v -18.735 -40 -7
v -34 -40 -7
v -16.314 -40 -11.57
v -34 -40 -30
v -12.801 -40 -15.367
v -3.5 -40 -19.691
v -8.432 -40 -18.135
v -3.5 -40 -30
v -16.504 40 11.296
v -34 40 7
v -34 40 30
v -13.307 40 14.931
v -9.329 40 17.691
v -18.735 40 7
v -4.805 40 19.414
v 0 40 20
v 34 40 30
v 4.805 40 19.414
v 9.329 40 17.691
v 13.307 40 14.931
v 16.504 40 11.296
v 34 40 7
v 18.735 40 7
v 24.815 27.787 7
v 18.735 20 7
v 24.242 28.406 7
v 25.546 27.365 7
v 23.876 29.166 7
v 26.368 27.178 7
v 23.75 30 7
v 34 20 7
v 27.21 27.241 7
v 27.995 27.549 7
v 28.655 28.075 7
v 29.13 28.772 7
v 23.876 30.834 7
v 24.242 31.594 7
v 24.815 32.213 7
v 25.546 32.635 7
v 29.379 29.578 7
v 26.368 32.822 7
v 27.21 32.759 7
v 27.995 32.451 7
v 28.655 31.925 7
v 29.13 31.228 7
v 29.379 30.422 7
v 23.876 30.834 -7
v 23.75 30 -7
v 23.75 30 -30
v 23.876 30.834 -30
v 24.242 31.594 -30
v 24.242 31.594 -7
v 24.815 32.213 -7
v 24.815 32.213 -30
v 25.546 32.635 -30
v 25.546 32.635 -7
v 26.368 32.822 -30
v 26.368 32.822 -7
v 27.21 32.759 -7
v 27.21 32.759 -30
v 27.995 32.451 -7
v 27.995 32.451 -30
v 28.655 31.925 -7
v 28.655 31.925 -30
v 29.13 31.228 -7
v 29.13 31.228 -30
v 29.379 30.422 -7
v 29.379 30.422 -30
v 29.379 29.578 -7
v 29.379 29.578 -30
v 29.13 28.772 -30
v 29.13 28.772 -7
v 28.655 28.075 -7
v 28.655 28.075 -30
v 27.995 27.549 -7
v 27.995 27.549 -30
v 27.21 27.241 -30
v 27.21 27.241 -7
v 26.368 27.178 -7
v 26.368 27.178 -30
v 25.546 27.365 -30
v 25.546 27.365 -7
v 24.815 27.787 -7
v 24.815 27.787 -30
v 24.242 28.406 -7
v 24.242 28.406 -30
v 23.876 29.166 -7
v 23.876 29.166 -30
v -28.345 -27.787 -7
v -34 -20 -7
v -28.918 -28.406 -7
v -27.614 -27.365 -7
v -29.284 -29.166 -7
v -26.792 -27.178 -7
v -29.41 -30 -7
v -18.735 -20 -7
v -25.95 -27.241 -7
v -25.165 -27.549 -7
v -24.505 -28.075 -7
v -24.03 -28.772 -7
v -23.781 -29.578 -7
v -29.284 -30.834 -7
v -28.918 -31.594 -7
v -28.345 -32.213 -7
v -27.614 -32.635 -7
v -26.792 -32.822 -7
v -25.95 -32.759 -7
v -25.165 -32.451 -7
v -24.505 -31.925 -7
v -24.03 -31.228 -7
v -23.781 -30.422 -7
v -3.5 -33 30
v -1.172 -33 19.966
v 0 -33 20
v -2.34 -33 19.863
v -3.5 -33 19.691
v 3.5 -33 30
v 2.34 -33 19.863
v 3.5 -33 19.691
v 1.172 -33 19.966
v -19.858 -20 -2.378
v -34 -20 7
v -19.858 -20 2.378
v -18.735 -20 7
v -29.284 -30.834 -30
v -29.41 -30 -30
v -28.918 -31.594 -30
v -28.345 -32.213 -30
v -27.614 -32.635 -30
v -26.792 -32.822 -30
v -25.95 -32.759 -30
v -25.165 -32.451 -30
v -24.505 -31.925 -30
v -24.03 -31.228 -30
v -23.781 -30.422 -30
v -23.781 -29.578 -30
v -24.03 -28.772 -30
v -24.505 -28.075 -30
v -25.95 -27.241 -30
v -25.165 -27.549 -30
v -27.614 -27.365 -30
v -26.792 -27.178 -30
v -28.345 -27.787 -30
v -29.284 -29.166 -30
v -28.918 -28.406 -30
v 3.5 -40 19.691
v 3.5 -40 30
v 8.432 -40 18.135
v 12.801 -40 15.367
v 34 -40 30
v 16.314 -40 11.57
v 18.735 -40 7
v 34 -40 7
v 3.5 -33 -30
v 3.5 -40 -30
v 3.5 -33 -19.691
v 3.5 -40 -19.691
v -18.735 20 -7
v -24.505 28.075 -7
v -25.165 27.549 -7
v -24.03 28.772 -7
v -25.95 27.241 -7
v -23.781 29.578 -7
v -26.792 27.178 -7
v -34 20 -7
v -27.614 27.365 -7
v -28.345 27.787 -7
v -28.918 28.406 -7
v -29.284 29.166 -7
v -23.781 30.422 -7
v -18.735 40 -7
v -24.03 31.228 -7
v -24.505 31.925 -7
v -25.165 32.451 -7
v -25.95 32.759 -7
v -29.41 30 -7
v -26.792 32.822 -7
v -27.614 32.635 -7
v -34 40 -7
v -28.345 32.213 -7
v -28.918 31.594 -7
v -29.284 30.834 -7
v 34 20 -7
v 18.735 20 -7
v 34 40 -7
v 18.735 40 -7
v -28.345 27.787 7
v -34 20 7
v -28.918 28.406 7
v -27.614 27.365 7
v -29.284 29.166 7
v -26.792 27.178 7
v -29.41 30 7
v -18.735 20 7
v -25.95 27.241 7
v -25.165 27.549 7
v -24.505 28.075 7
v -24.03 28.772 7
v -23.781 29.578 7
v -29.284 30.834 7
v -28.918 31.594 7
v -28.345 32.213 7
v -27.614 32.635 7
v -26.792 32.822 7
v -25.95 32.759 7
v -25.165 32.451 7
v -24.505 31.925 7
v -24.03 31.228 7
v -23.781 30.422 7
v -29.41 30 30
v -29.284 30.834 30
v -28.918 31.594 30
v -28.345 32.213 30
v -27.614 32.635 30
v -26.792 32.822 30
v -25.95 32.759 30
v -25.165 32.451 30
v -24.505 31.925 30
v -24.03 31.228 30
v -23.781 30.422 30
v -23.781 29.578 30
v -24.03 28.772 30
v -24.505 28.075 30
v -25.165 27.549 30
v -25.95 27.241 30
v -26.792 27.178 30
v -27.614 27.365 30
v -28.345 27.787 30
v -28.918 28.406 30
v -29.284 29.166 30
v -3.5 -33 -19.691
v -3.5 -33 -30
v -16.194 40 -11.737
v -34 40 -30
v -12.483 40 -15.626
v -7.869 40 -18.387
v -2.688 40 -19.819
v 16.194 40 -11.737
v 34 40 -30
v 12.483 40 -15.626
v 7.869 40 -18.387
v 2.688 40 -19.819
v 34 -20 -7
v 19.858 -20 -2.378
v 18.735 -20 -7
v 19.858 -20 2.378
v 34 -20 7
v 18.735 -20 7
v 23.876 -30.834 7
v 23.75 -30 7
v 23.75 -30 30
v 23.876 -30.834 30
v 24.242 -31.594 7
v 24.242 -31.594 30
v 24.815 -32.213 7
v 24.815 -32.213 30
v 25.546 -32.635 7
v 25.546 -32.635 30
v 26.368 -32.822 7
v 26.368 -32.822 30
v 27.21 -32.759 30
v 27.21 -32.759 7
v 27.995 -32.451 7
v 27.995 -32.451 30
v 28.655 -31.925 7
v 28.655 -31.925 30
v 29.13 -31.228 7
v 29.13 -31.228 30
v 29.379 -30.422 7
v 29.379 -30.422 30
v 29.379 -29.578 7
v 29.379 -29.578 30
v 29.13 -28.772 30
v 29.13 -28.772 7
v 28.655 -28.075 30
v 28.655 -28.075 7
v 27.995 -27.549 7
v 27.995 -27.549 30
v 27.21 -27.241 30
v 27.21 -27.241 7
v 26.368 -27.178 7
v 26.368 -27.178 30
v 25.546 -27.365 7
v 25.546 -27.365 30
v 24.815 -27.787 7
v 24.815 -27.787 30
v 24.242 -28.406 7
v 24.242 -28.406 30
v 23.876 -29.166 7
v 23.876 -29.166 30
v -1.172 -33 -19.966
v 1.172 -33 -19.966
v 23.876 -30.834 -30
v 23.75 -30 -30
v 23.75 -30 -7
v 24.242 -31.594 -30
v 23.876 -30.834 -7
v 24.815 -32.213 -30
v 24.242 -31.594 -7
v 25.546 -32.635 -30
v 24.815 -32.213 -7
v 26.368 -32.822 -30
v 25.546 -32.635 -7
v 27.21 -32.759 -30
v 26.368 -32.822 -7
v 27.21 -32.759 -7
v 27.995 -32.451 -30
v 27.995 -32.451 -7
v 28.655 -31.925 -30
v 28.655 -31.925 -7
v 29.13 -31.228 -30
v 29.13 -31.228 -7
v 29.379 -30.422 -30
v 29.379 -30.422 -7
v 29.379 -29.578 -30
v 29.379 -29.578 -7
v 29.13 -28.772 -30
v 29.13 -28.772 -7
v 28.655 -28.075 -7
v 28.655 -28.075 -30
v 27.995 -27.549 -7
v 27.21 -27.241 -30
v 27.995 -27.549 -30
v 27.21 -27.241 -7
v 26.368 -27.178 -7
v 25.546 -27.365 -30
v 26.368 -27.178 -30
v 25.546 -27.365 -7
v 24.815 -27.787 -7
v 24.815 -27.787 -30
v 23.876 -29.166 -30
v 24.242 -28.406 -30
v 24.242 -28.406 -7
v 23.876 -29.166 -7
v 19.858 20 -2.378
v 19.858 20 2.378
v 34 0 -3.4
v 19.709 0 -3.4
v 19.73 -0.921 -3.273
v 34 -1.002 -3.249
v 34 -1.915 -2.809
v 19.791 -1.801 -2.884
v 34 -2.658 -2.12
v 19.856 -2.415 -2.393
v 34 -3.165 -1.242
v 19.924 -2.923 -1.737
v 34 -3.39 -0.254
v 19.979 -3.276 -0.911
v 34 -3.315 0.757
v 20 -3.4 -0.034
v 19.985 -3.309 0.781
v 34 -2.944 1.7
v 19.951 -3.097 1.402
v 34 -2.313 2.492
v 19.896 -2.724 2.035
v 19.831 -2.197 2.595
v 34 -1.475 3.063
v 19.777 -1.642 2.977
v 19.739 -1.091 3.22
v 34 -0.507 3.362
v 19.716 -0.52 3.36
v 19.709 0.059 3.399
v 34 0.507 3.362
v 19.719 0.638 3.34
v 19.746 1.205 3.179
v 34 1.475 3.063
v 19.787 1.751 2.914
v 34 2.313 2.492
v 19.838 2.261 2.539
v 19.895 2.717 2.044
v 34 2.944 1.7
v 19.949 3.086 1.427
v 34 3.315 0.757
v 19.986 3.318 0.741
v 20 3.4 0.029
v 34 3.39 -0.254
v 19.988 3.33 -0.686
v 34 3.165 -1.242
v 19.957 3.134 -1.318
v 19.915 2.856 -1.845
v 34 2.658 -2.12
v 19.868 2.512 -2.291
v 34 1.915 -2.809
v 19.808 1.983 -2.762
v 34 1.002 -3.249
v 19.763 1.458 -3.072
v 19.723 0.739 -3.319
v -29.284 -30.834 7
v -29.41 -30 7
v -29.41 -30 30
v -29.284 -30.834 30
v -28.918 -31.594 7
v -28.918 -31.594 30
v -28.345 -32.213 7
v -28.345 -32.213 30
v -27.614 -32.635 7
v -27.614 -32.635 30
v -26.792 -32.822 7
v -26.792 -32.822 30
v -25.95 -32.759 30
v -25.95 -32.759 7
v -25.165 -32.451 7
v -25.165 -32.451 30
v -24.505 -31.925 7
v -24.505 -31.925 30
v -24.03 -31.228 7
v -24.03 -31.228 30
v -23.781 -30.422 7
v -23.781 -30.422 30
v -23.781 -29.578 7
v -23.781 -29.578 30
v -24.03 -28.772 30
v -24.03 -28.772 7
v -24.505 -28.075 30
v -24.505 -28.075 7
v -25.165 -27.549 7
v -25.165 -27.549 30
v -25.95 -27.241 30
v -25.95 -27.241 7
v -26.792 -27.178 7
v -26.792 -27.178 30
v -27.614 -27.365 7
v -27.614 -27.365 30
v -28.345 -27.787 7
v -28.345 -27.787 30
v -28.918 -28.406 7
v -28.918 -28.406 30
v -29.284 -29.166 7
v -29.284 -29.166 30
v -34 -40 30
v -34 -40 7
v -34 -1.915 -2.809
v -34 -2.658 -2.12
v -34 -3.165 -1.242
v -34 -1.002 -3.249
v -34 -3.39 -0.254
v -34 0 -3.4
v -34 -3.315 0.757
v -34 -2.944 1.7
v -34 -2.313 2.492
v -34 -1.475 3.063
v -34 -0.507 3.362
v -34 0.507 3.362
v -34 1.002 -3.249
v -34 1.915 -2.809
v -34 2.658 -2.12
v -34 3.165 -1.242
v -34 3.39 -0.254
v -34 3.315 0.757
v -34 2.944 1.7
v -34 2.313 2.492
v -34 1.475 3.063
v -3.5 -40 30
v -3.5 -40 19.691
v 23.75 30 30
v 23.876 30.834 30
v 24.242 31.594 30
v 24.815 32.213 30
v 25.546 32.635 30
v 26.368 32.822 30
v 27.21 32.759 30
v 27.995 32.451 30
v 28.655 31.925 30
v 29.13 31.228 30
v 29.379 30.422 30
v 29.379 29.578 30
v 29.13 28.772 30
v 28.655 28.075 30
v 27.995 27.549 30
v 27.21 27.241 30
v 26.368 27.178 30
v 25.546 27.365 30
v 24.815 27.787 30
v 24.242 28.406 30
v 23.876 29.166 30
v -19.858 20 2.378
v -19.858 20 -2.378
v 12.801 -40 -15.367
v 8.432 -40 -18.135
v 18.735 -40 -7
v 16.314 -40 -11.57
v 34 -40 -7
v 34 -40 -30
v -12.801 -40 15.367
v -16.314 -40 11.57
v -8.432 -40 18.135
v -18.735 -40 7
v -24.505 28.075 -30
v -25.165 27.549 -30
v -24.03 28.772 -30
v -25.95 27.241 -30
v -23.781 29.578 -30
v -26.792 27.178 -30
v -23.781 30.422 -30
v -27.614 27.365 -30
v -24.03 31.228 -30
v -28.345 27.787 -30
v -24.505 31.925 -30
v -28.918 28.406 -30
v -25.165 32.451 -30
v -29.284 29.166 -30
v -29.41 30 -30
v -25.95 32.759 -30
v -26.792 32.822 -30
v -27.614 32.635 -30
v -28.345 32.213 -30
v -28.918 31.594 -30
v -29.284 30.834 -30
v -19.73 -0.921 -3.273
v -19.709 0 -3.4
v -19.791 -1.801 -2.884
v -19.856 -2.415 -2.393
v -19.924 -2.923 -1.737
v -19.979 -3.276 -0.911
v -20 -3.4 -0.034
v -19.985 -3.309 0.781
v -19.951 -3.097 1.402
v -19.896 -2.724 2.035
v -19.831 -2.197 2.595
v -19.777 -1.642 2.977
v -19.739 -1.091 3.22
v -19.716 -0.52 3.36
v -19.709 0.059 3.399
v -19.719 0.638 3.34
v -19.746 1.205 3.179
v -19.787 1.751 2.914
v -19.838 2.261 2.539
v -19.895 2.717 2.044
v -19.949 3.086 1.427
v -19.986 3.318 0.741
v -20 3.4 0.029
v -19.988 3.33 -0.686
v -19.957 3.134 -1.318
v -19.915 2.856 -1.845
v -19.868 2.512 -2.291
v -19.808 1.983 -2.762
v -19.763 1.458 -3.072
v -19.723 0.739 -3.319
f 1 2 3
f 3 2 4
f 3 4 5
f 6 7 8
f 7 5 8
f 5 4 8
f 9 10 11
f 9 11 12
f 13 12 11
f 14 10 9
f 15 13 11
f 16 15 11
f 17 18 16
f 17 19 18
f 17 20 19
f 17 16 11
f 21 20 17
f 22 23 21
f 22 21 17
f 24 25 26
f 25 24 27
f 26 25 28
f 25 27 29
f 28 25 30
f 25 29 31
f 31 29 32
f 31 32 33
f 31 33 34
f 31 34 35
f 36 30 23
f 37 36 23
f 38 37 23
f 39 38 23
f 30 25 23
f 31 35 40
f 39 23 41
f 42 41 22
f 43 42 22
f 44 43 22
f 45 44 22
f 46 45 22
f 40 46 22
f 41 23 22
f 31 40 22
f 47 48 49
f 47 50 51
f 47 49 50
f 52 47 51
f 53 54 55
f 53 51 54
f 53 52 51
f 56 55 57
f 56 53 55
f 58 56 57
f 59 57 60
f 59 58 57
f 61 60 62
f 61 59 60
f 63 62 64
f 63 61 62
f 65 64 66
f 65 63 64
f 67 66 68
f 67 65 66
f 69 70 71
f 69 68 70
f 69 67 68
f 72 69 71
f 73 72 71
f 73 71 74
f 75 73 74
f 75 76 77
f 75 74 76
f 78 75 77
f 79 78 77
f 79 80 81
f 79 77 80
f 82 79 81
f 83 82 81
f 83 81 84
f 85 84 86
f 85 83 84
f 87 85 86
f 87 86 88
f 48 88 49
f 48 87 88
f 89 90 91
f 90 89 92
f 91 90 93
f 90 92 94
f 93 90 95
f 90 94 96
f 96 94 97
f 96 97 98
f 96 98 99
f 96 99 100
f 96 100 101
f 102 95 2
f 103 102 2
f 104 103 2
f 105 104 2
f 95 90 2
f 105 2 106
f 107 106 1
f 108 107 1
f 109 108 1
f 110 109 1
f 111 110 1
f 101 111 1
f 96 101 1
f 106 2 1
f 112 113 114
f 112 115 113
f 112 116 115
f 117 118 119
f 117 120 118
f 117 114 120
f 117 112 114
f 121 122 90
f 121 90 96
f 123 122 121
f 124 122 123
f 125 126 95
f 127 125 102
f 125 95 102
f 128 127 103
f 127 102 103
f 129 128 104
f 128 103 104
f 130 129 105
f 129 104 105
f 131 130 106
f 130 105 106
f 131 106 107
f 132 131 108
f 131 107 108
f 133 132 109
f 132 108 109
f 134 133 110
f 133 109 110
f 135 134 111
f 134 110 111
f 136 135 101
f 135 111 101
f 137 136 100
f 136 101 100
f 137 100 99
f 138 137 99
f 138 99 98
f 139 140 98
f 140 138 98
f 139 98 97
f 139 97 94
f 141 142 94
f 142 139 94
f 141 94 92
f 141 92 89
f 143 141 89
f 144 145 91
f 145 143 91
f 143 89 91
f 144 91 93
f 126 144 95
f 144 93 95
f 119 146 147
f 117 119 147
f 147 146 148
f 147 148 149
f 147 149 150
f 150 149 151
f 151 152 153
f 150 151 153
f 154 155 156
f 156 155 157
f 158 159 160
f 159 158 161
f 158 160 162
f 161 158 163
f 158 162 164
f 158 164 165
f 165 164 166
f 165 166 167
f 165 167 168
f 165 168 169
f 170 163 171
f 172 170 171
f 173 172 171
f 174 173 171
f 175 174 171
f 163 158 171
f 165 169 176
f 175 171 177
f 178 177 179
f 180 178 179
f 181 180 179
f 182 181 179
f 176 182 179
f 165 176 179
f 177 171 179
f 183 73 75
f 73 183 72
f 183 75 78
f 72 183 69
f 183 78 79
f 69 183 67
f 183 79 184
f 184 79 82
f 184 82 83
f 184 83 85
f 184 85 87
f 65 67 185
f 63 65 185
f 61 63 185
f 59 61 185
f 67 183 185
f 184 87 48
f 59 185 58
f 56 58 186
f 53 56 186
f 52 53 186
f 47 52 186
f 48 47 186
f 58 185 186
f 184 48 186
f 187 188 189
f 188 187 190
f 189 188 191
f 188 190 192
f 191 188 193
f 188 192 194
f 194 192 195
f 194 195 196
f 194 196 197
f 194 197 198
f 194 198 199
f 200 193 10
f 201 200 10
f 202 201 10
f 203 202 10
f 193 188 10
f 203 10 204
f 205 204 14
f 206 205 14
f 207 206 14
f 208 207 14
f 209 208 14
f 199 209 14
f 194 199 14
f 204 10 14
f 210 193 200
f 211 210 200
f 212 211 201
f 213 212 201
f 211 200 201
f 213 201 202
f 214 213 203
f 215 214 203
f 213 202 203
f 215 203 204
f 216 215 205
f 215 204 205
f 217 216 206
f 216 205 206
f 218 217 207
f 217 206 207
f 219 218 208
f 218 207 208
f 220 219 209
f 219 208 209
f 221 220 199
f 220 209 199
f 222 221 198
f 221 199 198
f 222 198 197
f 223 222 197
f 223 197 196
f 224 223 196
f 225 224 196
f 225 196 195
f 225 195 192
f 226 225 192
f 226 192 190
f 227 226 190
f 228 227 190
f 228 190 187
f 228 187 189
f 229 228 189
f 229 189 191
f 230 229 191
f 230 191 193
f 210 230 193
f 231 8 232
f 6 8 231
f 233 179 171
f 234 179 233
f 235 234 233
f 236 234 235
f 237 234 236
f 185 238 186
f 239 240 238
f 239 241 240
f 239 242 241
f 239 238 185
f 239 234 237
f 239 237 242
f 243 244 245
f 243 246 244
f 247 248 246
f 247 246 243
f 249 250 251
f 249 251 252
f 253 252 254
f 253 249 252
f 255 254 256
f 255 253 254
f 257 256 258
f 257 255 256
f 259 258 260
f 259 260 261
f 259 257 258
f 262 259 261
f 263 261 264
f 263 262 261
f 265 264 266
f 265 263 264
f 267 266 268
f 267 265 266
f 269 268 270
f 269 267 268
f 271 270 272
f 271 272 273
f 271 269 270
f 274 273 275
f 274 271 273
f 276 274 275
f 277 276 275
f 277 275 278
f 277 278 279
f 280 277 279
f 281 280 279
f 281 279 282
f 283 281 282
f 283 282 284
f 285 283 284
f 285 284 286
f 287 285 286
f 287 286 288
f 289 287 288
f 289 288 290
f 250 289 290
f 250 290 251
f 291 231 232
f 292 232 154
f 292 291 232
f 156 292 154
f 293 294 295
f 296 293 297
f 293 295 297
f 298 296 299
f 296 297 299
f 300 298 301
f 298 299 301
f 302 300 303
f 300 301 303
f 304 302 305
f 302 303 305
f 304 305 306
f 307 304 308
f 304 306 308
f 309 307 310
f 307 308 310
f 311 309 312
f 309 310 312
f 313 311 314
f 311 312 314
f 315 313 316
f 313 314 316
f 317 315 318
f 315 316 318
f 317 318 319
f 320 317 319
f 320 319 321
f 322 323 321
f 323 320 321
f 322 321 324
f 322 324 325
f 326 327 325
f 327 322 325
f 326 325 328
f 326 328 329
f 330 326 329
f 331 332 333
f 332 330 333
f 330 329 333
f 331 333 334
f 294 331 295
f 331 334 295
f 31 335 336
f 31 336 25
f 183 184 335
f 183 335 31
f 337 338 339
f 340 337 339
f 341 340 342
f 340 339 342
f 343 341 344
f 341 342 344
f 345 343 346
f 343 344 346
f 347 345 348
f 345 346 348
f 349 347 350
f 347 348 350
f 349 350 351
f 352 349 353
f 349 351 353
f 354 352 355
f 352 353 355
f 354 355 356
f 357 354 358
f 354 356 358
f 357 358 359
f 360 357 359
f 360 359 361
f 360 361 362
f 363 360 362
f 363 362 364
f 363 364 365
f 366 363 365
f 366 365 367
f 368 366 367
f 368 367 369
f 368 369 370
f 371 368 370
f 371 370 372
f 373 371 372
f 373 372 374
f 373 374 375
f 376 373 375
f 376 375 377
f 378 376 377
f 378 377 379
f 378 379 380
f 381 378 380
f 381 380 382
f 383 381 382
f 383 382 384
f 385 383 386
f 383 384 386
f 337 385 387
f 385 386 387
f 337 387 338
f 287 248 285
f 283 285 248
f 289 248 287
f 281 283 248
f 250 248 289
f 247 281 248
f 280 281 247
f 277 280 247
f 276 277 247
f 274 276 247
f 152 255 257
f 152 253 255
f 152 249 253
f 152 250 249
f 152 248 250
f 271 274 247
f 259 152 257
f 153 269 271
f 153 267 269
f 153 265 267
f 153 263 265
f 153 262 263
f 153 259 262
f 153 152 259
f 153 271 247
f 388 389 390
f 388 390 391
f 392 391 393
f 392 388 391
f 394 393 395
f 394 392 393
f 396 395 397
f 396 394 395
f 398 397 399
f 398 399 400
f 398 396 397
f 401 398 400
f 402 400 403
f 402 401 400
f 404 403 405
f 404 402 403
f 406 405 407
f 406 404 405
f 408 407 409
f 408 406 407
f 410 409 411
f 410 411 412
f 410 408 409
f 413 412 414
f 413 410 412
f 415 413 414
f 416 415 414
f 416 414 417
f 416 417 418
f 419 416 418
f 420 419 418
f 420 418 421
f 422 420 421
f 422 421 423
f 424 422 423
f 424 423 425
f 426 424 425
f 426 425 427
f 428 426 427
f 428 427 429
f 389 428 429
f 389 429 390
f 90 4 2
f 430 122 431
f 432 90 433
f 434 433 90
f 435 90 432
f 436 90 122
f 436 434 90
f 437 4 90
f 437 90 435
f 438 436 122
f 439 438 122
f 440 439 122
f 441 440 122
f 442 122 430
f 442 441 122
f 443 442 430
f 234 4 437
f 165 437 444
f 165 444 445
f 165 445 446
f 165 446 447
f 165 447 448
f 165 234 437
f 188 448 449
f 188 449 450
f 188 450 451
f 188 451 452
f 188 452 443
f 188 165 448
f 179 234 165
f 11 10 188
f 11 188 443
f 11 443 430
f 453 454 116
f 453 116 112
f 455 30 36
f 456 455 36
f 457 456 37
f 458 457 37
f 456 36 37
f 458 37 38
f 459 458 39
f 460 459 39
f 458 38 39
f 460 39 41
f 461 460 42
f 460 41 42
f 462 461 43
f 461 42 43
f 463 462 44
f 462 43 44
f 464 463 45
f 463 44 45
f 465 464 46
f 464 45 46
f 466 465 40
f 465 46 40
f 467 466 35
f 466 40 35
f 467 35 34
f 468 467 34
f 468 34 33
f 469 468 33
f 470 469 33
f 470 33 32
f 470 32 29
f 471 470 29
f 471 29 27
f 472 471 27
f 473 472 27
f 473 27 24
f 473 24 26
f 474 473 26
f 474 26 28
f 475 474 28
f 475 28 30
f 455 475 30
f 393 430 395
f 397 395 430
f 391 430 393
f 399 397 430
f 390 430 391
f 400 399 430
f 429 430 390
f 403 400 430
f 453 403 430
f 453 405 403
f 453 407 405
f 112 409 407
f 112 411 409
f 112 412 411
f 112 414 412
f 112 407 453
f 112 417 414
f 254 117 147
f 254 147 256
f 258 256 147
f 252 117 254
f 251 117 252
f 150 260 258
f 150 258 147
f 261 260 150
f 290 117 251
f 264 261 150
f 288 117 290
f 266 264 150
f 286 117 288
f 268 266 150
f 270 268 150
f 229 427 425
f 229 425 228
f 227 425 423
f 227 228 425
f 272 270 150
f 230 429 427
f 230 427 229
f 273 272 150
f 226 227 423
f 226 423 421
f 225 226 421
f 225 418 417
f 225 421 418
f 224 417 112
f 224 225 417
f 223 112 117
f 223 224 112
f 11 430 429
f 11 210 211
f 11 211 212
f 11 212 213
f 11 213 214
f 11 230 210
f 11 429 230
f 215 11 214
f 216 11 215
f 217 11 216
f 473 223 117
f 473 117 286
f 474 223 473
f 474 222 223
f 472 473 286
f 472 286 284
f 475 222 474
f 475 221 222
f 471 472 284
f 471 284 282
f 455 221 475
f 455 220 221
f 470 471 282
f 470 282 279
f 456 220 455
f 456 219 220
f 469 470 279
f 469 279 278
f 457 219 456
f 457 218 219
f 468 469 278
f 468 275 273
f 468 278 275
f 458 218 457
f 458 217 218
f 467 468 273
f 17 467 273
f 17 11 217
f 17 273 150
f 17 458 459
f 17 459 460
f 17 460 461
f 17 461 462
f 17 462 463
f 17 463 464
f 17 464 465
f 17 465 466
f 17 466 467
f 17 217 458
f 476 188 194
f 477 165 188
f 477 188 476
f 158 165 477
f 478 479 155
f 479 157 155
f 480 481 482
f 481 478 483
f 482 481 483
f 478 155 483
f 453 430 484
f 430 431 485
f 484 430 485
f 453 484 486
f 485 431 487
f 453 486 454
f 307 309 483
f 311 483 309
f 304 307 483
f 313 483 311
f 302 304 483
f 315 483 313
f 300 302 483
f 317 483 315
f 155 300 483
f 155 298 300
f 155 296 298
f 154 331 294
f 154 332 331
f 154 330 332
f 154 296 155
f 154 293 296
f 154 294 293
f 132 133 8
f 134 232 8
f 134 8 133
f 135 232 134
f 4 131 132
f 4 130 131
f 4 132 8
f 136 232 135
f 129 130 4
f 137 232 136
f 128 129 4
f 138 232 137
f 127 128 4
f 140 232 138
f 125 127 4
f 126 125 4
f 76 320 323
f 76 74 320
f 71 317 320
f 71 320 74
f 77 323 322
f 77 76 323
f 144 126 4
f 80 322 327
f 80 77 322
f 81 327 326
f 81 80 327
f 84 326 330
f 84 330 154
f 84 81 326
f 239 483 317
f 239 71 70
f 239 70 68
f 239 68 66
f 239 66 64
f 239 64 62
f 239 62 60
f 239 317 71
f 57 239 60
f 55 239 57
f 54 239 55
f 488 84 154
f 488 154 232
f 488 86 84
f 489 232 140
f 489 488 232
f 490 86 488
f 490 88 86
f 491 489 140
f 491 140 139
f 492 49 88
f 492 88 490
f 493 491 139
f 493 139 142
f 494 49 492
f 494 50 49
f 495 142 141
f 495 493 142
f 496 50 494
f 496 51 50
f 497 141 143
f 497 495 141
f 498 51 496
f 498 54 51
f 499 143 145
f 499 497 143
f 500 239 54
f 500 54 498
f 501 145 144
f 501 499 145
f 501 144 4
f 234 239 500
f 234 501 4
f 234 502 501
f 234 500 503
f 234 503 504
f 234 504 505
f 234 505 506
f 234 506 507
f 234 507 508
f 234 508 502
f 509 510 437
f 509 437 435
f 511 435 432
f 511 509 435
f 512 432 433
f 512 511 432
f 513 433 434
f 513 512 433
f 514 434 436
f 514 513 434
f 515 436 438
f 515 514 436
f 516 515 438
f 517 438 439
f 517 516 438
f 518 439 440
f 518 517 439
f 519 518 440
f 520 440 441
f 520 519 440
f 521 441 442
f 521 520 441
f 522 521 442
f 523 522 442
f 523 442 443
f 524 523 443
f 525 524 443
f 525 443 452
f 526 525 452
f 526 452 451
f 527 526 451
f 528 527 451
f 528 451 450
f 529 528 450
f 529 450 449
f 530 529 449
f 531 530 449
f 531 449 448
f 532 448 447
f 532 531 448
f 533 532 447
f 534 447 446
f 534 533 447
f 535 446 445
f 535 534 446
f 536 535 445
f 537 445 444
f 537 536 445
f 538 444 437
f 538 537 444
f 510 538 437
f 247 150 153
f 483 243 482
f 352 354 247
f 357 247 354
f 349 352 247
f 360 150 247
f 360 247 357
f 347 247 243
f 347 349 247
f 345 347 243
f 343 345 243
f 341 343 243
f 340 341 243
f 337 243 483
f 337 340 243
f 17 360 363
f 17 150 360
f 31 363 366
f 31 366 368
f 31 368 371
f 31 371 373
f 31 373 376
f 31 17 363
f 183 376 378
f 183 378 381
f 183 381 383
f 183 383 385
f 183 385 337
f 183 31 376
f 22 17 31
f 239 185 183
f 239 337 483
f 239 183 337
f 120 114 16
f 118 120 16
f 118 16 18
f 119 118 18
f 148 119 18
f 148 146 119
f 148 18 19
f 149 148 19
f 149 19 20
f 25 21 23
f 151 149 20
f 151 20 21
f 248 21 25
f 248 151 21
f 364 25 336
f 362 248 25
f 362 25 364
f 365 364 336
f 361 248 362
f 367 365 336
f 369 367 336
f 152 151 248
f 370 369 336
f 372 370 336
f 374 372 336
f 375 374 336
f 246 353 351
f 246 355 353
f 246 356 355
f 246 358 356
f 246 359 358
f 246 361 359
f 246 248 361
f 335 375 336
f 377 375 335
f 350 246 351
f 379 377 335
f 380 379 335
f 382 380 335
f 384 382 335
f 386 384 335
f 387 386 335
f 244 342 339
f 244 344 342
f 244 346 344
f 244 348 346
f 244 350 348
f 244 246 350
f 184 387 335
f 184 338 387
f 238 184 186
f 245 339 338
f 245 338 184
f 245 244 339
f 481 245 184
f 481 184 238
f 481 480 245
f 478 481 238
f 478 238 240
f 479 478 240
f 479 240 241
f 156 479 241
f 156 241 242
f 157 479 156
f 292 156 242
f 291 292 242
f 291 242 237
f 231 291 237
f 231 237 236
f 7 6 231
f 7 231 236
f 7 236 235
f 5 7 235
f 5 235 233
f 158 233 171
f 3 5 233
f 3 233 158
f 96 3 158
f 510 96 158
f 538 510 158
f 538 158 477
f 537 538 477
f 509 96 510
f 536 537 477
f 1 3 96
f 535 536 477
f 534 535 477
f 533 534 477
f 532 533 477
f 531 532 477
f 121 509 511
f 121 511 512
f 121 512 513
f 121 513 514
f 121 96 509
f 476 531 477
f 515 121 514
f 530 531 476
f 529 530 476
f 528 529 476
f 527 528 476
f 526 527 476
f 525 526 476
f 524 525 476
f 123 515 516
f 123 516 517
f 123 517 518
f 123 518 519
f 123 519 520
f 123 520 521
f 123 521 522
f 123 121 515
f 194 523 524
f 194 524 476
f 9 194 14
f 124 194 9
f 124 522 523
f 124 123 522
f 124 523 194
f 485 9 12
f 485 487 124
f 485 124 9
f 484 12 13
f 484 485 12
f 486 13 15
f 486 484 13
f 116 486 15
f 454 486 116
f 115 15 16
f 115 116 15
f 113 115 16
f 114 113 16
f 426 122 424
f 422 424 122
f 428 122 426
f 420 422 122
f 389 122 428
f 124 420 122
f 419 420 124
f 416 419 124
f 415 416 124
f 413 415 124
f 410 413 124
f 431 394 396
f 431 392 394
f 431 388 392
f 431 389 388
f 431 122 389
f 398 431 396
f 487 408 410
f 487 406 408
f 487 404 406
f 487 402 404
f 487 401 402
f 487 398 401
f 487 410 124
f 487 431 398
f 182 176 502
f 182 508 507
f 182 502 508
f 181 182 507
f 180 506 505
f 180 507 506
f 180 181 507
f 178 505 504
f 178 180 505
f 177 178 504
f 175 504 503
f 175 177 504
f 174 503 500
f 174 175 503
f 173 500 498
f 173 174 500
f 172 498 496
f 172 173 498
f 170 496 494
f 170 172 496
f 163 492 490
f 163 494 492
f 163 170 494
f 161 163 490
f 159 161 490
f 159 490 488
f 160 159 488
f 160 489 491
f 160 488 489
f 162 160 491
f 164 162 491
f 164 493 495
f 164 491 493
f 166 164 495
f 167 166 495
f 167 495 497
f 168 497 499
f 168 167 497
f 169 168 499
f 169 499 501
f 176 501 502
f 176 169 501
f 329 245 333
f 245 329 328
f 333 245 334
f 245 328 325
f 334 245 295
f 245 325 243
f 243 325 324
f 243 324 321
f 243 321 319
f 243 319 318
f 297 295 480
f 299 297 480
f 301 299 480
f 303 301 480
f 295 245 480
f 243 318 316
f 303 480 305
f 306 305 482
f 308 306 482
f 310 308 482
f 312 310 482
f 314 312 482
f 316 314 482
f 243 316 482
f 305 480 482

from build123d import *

# Parameters (mm, degrees)
SKETCH1_R                       = 20
BOSS_EXTRUDE1_DEPTH             = 40
SKETCH26_W                      = 15.7
SKETCH26_H                      = 14
CUT_EXTRUDE19_DEPTH             = 20
SKETCH30_W                      = 92.939365228
SKETCH30_H                      = 14
CUT_EXTRUDE22_DEPTH             = 20
CUT_EXTRUDE20_REACH             = 62.465
SKETCH27_R                      = 2.830219018
CUT_EXTRUDE20_DIRECTION_2_REACH = 62.465
CUT_EXTRUDE24_START             = -20
SKETCH33_R                      = 3.4
CUT_EXTRUDE24_DEPTH             = 50
SKETCH37_W                      = 7
SKETCH37_H                      = 70.017745432
CUT_EXTRUDE26_DEPTH             = 7


with BuildPart() as part:
    # Sketch1 → Boss-Extrude1 (new, symmetric)
    with BuildSketch(Plane(origin=(0, 0, 0), x_dir=(1, 0, 0), z_dir=(0, 1, 0))):
        Polygon((-20, -30), (34, -30), (34, 30), (-20, 30), (-34, 30), (-34, -30), align=None)
        Circle(SKETCH1_R, mode=Mode.SUBTRACT)
    extrude(amount=BOSS_EXTRUDE1_DEPTH, both=True)

    # Sketch26 → Cut-Extrude19 (cut)
    with BuildSketch(Plane(origin=(0, 40, 0), x_dir=(1, 0, 0), z_dir=(0, 1, 0))):
        with Locations((26.584993995, 0)):
            Rectangle(SKETCH26_W, SKETCH26_H)
        with BuildLine():
            Line((-34.434993995, -7), (-18.734993995, -7))
            ThreePointArc((-18.734993995, -7), (-20, 0), (-18.734993995, 7))
            Line((-18.734993995, 7), (-34.434993995, 7))
            Line((-34.434993995, 7), (-34.434993995, -7))
        make_face()
    extrude(amount=-CUT_EXTRUDE19_DEPTH, mode=Mode.SUBTRACT)

    # Sketch30 → Cut-Extrude22 (cut)
    with BuildSketch(Plane.XZ.offset(40)):
        Rectangle(SKETCH30_W, SKETCH30_H)
    extrude(amount=-CUT_EXTRUDE22_DEPTH, mode=Mode.SUBTRACT)

    # Cut-Extrude20: up to this face of the body (flat: up to its plane)
    cut_extrude20_end = Plane(part.part.faces().sort_by_distance((0, 0, 30))[0])
    # Sketch27 → Cut-Extrude20 (cut, up to the picked face)
    with BuildSketch(Plane(origin=(0, 0, 0), x_dir=(-1, 0, 0), z_dir=(0, 0, -1)), mode=Mode.PRIVATE) as cut_extrude20_sk1:
        with Locations((26.58, 30)):
            Circle(SKETCH27_R)
    cut_extrude20_tool1 = split(extrude(cut_extrude20_sk1.sketch, amount=-CUT_EXTRUDE20_REACH, mode=Mode.PRIVATE), bisect_by=cut_extrude20_end, keep=Keep.BOTH, mode=Mode.PRIVATE)
    # Sketch27 → Cut-Extrude20 (cut, up to the picked face)
    with BuildSketch(Plane(origin=(0, 0, 0), x_dir=(-1, 0, 0), z_dir=(0, 0, -1)), mode=Mode.PRIVATE) as cut_extrude20_sk2:
        with Locations((-26.58, 30)):
            Circle(SKETCH27_R)
    cut_extrude20_tool2 = split(extrude(cut_extrude20_sk2.sketch, amount=-CUT_EXTRUDE20_REACH, mode=Mode.PRIVATE), bisect_by=cut_extrude20_end, keep=Keep.BOTH, mode=Mode.PRIVATE)
    cut_extrude20_1 = cut_extrude20_tool1.solids().sort_by(Axis((-26.58, 30, 0), (0, 0, 1)))[0]
    add(cut_extrude20_1, mode=Mode.SUBTRACT)
    cut_extrude20_2 = cut_extrude20_tool2.solids().sort_by(Axis((26.58, 30, 0), (0, 0, 1)))[0]
    add(cut_extrude20_2, mode=Mode.SUBTRACT)
    cut_extrude20 = cut_extrude20_1 + cut_extrude20_2  # Cut-Extrude20 as one shape, for the pattern or mirror that repeats it

    # Cut-Extrude20 direction 2: up to this face of the body (flat: up to its plane)
    cut_extrude20_direction_2_end = Plane(part.part.faces().sort_by_distance((0, 0, -30))[0])
    # Sketch27 → Cut-Extrude20 direction 2 (cut, up to the picked face)
    with BuildSketch(Plane(origin=(0, 0, 0), x_dir=(-1, 0, 0), z_dir=(0, 0, -1)), mode=Mode.PRIVATE) as cut_extrude20_direction_2_sk1:
        with Locations((26.58, 30)):
            Circle(SKETCH27_R)
    cut_extrude20_direction_2_tool1 = split(extrude(cut_extrude20_direction_2_sk1.sketch, amount=CUT_EXTRUDE20_DIRECTION_2_REACH, mode=Mode.PRIVATE), bisect_by=cut_extrude20_direction_2_end, keep=Keep.BOTH, mode=Mode.PRIVATE)
    # Sketch27 → Cut-Extrude20 direction 2 (cut, up to the picked face)
    with BuildSketch(Plane(origin=(0, 0, 0), x_dir=(-1, 0, 0), z_dir=(0, 0, -1)), mode=Mode.PRIVATE) as cut_extrude20_direction_2_sk2:
        with Locations((-26.58, 30)):
            Circle(SKETCH27_R)
    cut_extrude20_direction_2_tool2 = split(extrude(cut_extrude20_direction_2_sk2.sketch, amount=CUT_EXTRUDE20_DIRECTION_2_REACH, mode=Mode.PRIVATE), bisect_by=cut_extrude20_direction_2_end, keep=Keep.BOTH, mode=Mode.PRIVATE)
    cut_extrude20_direction_2_1 = cut_extrude20_direction_2_tool1.solids().sort_by(Axis((-26.58, 30, 0), (0, 0, -1)))[0]
    add(cut_extrude20_direction_2_1, mode=Mode.SUBTRACT)
    cut_extrude20_direction_2_2 = cut_extrude20_direction_2_tool2.solids().sort_by(Axis((26.58, 30, 0), (0, 0, -1)))[0]
    add(cut_extrude20_direction_2_2, mode=Mode.SUBTRACT)
    cut_extrude20_direction_2 = cut_extrude20_direction_2_1 + cut_extrude20_direction_2_2  # Cut-Extrude20 direction 2 as one shape, for the pattern or mirror that repeats it

    # Mirror1: Cut-Extrude20, Cut-Extrude20 direction 2 across plane
    add(cut_extrude20.mirror(Plane.ZX), mode=Mode.SUBTRACT)
    add(cut_extrude20_direction_2.mirror(Plane.ZX), mode=Mode.SUBTRACT)

    # Sketch33 → Cut-Extrude24 (cut)
    with BuildSketch(Plane.ZY.offset(34).offset(CUT_EXTRUDE24_START)):
        Circle(SKETCH33_R)
    cut_extrude24 = extrude(amount=CUT_EXTRUDE24_DEPTH, mode=Mode.SUBTRACT)

    # Mirror6: Cut-Extrude24 across plane
    add(cut_extrude24.mirror(Plane(origin=(0, 0, 0), x_dir=(0, 0, 1), z_dir=(1, 0, 0))), mode=Mode.SUBTRACT)

    # Sketch37 → Cut-Extrude26 (cut)
    with BuildSketch(Plane.XZ.offset(40)):
        Rectangle(SKETCH37_W, SKETCH37_H)
    extrude(amount=-CUT_EXTRUDE26_DEPTH, mode=Mode.SUBTRACT)


solid = part.part
